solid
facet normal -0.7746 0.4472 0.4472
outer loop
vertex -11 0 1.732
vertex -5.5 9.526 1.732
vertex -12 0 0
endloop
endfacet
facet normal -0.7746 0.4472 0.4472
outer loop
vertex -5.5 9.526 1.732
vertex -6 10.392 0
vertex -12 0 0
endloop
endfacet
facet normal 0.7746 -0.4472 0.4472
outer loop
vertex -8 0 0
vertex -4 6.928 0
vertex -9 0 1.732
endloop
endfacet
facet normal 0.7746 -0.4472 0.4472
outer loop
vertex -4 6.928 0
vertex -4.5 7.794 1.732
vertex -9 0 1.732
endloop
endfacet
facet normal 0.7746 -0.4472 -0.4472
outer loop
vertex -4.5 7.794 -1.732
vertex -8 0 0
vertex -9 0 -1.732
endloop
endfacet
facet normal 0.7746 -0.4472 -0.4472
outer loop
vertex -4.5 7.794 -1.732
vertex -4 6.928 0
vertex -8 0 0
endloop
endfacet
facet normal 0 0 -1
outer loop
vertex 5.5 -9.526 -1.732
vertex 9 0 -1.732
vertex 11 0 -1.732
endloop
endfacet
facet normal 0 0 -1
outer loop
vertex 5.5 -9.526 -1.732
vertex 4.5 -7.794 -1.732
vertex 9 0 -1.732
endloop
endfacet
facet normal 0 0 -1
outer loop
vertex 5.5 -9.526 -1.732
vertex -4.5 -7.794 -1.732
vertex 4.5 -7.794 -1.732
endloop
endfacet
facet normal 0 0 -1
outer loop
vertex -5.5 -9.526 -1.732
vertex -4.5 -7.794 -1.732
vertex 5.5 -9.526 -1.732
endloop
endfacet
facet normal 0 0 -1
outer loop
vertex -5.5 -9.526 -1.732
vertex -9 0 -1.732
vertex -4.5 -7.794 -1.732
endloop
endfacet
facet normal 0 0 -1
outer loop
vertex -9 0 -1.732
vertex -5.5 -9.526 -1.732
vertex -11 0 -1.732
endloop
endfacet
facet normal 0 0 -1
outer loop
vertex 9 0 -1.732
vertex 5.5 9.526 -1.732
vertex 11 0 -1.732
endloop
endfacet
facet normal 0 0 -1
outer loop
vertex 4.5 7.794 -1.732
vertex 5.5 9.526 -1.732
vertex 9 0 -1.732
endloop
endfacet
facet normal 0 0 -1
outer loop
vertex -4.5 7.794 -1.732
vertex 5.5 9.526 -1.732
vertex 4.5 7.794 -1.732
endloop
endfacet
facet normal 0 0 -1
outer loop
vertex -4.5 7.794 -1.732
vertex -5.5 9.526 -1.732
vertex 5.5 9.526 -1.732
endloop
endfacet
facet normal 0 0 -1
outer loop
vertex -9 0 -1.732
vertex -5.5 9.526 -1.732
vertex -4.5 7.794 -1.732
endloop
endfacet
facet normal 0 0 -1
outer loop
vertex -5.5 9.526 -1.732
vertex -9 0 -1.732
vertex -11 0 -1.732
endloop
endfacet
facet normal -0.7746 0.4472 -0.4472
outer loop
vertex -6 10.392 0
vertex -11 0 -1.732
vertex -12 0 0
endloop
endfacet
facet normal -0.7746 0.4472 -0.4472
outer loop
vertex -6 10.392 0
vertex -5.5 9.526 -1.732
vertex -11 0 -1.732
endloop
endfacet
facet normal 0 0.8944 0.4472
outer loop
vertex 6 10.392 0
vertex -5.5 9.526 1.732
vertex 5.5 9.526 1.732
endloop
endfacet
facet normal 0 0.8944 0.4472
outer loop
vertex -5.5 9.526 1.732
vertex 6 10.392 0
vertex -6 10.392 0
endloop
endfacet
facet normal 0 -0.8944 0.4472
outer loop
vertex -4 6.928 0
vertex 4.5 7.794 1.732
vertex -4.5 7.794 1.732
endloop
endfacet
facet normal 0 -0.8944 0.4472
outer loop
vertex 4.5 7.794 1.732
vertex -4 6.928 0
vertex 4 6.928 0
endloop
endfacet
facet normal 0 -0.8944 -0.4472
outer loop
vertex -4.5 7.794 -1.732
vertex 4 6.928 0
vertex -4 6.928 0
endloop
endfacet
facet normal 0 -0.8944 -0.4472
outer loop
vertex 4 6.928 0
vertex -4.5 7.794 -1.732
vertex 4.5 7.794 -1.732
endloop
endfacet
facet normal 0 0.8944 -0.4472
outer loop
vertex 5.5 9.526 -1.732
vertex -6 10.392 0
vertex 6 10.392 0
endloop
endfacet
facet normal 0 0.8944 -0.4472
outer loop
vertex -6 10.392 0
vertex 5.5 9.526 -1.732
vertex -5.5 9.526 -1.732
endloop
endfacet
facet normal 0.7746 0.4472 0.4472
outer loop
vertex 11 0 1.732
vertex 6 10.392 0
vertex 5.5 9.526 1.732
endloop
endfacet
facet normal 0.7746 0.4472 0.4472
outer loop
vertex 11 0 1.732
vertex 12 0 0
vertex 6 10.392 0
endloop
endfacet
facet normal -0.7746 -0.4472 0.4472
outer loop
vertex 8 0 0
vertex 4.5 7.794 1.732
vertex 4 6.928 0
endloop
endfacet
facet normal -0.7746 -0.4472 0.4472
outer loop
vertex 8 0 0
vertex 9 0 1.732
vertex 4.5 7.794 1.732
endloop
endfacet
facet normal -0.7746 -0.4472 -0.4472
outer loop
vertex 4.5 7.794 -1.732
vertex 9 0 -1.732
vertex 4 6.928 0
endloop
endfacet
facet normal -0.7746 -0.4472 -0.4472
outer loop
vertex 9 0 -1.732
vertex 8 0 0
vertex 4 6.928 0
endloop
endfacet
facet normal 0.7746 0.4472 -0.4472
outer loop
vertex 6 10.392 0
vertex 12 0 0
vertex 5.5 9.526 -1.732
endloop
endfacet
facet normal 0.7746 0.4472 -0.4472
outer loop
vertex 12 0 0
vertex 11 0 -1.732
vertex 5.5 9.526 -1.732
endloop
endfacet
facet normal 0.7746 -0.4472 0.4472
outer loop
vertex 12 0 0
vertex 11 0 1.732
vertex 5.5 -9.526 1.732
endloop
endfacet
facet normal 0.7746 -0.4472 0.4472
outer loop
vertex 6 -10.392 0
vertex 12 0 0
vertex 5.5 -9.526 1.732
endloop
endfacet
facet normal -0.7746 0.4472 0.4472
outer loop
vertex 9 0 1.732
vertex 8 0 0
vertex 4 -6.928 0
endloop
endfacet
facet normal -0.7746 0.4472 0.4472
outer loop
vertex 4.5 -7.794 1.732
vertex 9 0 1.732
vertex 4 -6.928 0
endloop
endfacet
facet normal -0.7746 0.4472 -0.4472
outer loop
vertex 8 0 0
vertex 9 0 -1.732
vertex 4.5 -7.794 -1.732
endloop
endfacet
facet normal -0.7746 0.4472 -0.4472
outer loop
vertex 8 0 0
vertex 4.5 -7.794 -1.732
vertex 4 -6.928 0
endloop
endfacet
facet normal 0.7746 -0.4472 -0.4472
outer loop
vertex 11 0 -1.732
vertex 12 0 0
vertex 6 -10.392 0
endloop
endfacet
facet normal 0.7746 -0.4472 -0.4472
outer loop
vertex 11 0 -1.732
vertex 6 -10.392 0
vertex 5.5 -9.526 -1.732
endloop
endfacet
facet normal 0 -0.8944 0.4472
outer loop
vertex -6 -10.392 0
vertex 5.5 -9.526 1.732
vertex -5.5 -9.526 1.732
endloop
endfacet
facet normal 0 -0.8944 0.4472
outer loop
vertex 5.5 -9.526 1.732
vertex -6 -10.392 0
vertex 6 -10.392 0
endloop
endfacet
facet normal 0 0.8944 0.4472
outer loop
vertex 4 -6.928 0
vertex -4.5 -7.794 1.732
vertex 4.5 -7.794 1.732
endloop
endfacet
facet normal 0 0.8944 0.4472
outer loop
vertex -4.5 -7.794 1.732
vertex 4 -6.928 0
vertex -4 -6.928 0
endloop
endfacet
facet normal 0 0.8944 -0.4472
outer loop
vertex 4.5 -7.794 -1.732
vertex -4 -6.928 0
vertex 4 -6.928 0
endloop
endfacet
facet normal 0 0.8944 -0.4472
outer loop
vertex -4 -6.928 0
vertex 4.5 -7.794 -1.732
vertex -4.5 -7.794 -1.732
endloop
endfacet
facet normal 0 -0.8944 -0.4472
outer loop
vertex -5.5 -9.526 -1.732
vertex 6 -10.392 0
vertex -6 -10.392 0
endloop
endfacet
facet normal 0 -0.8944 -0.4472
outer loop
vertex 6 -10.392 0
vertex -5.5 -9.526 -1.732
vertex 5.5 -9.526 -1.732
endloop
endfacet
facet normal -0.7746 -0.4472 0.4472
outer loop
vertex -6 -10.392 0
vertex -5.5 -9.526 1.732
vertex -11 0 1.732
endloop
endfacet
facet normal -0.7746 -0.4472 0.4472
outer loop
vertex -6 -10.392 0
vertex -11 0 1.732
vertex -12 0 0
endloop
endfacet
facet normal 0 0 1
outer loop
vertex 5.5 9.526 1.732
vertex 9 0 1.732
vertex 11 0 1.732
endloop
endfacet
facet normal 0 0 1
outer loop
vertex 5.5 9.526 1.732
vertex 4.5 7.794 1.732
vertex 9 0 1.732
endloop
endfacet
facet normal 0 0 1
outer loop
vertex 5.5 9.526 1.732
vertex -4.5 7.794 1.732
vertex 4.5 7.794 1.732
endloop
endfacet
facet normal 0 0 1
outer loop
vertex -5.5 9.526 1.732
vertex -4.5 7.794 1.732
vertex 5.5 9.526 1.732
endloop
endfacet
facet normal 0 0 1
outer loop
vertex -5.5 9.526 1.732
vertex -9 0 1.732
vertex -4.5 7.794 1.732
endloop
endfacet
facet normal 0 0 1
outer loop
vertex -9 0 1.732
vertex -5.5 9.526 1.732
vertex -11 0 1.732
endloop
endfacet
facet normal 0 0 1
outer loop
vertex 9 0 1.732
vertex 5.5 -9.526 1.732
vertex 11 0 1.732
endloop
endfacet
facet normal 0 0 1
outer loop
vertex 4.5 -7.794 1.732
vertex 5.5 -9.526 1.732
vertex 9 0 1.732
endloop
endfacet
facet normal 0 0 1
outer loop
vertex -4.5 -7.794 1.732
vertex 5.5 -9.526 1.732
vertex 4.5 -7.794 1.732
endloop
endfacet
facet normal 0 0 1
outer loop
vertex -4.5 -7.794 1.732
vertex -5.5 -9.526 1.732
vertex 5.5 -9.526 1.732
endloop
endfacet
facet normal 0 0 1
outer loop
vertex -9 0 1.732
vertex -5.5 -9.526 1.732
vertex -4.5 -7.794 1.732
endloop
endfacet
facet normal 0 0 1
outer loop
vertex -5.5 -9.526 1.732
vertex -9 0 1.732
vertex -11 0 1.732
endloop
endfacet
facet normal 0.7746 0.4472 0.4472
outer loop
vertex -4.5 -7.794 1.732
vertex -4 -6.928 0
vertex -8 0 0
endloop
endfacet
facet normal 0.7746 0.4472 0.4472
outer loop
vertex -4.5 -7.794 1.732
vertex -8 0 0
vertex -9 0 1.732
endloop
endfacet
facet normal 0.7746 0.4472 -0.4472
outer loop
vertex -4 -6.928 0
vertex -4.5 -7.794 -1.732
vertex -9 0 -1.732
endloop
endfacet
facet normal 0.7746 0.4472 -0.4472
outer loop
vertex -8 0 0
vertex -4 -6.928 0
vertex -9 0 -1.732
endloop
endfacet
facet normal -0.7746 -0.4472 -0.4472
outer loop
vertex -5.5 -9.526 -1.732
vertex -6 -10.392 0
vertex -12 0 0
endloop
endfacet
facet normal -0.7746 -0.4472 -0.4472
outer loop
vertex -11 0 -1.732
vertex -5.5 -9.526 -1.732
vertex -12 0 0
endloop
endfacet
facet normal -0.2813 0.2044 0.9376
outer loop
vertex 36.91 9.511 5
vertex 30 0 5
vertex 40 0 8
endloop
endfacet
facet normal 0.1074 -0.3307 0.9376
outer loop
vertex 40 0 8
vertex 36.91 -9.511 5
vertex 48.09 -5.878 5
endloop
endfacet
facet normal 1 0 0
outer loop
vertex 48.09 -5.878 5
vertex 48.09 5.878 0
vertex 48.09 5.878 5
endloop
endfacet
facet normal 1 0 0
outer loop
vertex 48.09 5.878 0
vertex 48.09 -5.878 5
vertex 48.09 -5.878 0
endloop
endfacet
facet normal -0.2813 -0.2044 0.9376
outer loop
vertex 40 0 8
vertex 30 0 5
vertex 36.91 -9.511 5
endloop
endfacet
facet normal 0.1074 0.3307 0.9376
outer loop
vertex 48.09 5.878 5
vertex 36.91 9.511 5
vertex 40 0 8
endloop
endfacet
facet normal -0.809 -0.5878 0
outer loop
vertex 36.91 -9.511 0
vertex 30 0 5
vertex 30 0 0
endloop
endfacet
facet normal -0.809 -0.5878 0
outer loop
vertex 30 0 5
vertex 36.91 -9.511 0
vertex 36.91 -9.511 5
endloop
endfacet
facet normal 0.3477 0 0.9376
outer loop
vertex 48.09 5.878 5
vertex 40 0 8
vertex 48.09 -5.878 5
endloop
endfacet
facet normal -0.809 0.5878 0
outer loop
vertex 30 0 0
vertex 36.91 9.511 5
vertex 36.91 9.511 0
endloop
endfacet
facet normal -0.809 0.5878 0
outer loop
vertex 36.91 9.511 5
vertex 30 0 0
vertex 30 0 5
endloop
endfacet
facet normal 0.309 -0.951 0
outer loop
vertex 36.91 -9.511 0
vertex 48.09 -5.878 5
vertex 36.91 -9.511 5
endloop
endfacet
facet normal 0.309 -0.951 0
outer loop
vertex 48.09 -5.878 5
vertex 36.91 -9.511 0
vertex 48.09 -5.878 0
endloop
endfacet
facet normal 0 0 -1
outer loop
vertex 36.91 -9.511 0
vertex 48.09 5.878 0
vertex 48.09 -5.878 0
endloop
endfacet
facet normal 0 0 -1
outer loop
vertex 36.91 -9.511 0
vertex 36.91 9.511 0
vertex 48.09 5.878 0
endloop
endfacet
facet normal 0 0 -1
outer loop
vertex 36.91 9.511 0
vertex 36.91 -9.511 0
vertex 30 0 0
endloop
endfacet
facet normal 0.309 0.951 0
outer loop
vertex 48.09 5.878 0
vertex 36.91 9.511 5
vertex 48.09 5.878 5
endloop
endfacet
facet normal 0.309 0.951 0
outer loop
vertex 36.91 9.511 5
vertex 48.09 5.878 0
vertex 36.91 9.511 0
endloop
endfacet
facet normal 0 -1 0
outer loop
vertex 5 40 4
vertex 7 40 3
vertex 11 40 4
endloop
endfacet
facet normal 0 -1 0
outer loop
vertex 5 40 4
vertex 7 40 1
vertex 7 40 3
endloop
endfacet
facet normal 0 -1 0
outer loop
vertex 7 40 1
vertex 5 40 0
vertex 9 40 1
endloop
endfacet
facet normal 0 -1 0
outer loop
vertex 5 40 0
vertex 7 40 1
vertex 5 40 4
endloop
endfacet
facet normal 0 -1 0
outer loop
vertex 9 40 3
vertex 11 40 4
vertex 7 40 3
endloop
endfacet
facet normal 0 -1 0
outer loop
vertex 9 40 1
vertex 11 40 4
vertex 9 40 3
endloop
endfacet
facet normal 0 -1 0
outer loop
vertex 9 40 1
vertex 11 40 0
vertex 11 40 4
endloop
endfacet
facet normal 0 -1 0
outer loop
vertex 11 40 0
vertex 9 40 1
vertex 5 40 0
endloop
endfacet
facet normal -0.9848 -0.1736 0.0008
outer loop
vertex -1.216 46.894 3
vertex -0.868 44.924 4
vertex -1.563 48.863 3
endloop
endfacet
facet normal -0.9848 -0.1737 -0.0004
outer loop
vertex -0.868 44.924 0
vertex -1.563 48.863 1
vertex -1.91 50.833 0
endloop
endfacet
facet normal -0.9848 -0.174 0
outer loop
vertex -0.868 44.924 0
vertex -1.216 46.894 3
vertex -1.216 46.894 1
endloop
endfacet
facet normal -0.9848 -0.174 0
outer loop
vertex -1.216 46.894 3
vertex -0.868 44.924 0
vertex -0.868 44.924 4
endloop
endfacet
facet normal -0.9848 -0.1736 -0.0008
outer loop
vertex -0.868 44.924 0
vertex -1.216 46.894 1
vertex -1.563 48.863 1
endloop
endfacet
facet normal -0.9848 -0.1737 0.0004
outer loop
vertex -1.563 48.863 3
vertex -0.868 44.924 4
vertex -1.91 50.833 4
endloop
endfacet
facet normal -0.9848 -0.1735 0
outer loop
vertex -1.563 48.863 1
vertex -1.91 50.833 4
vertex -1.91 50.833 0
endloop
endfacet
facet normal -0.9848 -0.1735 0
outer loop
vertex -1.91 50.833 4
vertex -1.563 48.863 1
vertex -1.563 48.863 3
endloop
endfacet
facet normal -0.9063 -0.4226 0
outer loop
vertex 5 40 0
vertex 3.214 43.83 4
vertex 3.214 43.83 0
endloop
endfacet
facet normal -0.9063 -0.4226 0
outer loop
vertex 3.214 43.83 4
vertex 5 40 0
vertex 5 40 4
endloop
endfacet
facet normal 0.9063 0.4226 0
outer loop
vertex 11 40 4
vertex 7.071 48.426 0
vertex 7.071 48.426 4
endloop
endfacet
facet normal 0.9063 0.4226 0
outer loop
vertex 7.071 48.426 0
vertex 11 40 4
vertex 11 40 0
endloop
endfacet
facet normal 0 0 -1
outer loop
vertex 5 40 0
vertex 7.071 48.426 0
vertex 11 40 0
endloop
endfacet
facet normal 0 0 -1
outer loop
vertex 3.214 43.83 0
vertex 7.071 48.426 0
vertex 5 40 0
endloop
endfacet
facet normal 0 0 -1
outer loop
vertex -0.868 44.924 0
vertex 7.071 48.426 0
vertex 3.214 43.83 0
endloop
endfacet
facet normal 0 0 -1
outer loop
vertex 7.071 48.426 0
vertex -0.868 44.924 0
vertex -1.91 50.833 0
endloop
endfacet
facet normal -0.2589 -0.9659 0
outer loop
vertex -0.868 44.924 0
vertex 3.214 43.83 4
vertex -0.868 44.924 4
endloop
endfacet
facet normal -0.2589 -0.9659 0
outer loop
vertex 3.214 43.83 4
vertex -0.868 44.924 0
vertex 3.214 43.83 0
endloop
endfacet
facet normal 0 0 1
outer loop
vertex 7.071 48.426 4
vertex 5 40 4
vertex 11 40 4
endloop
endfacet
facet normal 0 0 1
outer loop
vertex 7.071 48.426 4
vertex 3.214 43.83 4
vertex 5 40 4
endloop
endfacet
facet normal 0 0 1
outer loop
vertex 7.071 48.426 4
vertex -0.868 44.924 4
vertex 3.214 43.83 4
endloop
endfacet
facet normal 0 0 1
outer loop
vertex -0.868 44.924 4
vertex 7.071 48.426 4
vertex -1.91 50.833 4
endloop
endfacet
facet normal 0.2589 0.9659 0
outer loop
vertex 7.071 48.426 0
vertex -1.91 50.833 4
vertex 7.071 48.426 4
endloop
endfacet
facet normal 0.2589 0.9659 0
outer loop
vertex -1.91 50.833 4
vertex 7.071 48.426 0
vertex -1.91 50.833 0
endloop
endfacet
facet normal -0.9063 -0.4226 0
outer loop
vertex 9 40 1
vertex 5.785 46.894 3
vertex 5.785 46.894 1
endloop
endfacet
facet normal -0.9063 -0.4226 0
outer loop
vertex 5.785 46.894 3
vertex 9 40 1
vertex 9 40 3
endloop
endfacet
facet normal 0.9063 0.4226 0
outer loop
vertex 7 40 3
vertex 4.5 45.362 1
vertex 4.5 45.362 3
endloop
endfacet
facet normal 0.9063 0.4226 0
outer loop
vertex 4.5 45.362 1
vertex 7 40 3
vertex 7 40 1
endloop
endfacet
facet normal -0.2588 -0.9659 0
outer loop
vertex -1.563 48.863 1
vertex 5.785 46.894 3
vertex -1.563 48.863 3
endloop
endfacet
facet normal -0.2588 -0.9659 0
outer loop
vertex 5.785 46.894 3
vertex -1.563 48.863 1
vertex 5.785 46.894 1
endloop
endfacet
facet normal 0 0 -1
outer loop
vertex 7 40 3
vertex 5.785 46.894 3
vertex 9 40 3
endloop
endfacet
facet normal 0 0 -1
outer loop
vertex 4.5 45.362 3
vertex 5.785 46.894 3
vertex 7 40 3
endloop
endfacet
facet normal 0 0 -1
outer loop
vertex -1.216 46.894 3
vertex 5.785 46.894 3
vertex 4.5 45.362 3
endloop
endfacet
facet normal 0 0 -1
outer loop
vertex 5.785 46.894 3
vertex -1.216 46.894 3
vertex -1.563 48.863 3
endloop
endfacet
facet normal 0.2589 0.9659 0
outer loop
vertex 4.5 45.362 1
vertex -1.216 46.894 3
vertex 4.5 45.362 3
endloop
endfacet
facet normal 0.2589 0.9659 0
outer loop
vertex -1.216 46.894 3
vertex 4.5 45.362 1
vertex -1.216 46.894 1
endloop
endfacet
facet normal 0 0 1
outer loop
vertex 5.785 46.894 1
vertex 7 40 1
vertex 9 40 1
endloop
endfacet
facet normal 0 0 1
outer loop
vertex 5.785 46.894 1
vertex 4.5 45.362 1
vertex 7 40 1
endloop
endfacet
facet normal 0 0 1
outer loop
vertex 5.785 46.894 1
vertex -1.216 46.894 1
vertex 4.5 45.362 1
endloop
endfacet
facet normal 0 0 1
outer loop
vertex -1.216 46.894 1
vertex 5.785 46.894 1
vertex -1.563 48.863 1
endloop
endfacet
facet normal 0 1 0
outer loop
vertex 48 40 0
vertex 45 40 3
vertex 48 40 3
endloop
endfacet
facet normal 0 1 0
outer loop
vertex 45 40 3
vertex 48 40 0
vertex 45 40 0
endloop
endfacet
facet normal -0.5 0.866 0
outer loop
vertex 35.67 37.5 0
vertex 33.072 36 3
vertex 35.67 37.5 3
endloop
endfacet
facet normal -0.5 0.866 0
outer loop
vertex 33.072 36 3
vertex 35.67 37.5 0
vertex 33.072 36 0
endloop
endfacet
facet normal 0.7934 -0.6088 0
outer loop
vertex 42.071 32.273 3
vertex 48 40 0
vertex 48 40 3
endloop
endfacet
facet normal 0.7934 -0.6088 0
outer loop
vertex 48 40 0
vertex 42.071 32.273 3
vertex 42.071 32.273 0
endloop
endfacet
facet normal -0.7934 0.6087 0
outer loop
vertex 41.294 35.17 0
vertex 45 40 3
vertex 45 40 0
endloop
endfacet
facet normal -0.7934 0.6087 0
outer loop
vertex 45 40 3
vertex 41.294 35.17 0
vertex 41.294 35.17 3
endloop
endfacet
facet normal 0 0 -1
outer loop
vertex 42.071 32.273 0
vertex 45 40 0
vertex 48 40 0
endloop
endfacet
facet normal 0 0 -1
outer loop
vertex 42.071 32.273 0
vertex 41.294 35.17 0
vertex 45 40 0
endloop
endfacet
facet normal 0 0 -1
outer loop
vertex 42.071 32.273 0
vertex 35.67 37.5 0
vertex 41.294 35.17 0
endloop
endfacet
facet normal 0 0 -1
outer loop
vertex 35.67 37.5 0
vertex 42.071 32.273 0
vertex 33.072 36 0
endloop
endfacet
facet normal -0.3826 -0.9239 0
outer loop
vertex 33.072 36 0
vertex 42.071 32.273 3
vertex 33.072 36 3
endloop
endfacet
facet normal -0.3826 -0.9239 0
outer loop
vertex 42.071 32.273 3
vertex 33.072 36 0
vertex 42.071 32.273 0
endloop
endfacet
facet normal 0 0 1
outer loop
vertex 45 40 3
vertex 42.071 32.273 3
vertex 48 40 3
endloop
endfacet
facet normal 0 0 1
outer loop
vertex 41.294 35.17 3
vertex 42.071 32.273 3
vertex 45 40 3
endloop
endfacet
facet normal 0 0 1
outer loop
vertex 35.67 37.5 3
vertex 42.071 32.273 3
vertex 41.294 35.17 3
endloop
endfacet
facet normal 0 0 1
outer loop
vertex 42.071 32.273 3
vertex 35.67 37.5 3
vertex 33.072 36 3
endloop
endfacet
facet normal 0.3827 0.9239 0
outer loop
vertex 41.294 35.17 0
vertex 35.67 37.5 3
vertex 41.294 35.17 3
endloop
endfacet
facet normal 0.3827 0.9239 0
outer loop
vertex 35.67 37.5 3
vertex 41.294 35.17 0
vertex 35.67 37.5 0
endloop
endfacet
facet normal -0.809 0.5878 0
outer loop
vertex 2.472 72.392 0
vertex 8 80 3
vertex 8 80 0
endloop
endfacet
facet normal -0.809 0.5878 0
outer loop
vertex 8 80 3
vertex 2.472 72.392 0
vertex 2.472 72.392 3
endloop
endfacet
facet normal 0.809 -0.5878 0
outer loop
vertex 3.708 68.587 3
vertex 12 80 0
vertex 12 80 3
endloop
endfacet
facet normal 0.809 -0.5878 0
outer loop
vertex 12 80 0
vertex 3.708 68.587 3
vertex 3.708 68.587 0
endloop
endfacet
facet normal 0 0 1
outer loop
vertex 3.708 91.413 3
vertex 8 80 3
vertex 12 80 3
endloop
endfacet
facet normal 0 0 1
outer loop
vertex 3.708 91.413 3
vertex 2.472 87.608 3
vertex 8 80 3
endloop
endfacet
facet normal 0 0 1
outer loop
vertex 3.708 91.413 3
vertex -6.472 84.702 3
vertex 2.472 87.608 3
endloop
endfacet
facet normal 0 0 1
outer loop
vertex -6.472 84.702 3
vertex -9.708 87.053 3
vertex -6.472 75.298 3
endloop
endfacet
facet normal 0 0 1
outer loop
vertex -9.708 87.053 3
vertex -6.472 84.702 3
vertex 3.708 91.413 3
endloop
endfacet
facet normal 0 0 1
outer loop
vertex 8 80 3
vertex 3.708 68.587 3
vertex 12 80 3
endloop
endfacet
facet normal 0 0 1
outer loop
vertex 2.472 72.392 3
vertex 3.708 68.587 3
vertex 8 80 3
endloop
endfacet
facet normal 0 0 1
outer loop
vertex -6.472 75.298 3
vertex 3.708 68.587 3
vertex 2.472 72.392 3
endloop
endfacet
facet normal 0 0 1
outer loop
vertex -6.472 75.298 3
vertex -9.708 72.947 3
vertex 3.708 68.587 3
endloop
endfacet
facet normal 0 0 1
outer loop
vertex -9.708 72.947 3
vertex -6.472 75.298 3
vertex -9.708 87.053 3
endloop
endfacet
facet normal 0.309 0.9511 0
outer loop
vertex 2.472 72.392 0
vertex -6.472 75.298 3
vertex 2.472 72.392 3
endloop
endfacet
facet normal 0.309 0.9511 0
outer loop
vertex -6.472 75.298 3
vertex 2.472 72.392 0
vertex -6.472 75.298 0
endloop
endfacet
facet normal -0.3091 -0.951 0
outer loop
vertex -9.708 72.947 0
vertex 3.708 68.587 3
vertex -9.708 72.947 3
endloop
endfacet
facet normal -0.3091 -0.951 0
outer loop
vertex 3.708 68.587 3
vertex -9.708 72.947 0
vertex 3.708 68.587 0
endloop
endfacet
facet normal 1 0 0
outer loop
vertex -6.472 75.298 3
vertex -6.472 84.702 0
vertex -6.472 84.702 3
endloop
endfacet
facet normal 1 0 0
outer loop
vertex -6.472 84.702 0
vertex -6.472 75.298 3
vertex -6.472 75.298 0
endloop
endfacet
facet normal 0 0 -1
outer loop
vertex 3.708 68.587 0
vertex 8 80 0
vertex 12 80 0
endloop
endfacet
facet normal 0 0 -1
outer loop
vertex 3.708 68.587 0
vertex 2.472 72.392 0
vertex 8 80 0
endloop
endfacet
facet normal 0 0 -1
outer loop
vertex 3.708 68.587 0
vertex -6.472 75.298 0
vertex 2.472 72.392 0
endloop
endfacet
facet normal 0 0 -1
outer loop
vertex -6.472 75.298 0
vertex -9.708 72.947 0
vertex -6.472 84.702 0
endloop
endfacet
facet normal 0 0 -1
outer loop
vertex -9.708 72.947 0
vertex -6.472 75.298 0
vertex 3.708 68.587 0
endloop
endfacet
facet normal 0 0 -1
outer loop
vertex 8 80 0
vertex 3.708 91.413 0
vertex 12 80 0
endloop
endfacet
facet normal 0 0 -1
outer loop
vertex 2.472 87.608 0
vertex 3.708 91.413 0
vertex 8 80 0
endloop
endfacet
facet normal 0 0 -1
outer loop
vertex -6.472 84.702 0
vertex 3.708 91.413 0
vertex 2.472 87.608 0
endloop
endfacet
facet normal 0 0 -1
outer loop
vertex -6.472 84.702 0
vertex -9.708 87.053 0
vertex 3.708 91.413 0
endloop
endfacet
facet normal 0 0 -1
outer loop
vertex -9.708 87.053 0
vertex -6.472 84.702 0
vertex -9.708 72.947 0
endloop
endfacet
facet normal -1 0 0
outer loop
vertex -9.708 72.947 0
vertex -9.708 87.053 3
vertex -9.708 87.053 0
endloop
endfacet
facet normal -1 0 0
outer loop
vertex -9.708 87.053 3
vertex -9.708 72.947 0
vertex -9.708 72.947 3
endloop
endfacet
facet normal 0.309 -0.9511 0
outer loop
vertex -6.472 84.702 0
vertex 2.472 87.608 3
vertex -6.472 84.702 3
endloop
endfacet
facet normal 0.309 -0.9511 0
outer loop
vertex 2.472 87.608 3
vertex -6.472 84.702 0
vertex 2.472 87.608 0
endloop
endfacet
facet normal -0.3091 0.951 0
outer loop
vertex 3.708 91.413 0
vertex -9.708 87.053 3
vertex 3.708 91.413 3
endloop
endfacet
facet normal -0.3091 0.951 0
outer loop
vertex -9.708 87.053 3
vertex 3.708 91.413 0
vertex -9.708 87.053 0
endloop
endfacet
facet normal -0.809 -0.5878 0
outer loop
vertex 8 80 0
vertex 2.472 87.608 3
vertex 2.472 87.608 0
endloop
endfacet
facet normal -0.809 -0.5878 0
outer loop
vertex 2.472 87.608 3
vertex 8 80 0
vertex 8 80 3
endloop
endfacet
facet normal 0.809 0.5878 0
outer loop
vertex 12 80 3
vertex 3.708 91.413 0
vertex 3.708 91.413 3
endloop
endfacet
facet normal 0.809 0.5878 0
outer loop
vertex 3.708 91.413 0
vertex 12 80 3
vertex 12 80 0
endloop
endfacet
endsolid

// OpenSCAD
// rotate_extrude($fn 3..12) is OpenSCAD's facets, on purpose — a hexagonal ring, not a torus (it was 21% over)
rotate_extrude($fn = 6) translate([10, 0]) circle(r = 2);
// a profile touching the axis: a pentagonal cone
translate([40, 0, 0]) rotate_extrude($fn = 5) polygon([[0, 0], [10, 0], [10, 5], [0, 8]]);
// a partial sweep of a profile with a hole, and one swept the other way
translate([0, 40, 0]) rotate_extrude(angle = 100, $fn = 8) translate([5, 0]) difference() { square([6, 4]); translate([2, 1]) square([2, 2]); }
translate([40, 40, 0]) rotate_extrude(angle = -150, $fn = 7) translate([5, 0]) square([3, 3]);
// a profile on the -x side
translate([0, 80, 0]) rotate_extrude($fn = 5) translate([-12, 0]) square([4, 3]);
